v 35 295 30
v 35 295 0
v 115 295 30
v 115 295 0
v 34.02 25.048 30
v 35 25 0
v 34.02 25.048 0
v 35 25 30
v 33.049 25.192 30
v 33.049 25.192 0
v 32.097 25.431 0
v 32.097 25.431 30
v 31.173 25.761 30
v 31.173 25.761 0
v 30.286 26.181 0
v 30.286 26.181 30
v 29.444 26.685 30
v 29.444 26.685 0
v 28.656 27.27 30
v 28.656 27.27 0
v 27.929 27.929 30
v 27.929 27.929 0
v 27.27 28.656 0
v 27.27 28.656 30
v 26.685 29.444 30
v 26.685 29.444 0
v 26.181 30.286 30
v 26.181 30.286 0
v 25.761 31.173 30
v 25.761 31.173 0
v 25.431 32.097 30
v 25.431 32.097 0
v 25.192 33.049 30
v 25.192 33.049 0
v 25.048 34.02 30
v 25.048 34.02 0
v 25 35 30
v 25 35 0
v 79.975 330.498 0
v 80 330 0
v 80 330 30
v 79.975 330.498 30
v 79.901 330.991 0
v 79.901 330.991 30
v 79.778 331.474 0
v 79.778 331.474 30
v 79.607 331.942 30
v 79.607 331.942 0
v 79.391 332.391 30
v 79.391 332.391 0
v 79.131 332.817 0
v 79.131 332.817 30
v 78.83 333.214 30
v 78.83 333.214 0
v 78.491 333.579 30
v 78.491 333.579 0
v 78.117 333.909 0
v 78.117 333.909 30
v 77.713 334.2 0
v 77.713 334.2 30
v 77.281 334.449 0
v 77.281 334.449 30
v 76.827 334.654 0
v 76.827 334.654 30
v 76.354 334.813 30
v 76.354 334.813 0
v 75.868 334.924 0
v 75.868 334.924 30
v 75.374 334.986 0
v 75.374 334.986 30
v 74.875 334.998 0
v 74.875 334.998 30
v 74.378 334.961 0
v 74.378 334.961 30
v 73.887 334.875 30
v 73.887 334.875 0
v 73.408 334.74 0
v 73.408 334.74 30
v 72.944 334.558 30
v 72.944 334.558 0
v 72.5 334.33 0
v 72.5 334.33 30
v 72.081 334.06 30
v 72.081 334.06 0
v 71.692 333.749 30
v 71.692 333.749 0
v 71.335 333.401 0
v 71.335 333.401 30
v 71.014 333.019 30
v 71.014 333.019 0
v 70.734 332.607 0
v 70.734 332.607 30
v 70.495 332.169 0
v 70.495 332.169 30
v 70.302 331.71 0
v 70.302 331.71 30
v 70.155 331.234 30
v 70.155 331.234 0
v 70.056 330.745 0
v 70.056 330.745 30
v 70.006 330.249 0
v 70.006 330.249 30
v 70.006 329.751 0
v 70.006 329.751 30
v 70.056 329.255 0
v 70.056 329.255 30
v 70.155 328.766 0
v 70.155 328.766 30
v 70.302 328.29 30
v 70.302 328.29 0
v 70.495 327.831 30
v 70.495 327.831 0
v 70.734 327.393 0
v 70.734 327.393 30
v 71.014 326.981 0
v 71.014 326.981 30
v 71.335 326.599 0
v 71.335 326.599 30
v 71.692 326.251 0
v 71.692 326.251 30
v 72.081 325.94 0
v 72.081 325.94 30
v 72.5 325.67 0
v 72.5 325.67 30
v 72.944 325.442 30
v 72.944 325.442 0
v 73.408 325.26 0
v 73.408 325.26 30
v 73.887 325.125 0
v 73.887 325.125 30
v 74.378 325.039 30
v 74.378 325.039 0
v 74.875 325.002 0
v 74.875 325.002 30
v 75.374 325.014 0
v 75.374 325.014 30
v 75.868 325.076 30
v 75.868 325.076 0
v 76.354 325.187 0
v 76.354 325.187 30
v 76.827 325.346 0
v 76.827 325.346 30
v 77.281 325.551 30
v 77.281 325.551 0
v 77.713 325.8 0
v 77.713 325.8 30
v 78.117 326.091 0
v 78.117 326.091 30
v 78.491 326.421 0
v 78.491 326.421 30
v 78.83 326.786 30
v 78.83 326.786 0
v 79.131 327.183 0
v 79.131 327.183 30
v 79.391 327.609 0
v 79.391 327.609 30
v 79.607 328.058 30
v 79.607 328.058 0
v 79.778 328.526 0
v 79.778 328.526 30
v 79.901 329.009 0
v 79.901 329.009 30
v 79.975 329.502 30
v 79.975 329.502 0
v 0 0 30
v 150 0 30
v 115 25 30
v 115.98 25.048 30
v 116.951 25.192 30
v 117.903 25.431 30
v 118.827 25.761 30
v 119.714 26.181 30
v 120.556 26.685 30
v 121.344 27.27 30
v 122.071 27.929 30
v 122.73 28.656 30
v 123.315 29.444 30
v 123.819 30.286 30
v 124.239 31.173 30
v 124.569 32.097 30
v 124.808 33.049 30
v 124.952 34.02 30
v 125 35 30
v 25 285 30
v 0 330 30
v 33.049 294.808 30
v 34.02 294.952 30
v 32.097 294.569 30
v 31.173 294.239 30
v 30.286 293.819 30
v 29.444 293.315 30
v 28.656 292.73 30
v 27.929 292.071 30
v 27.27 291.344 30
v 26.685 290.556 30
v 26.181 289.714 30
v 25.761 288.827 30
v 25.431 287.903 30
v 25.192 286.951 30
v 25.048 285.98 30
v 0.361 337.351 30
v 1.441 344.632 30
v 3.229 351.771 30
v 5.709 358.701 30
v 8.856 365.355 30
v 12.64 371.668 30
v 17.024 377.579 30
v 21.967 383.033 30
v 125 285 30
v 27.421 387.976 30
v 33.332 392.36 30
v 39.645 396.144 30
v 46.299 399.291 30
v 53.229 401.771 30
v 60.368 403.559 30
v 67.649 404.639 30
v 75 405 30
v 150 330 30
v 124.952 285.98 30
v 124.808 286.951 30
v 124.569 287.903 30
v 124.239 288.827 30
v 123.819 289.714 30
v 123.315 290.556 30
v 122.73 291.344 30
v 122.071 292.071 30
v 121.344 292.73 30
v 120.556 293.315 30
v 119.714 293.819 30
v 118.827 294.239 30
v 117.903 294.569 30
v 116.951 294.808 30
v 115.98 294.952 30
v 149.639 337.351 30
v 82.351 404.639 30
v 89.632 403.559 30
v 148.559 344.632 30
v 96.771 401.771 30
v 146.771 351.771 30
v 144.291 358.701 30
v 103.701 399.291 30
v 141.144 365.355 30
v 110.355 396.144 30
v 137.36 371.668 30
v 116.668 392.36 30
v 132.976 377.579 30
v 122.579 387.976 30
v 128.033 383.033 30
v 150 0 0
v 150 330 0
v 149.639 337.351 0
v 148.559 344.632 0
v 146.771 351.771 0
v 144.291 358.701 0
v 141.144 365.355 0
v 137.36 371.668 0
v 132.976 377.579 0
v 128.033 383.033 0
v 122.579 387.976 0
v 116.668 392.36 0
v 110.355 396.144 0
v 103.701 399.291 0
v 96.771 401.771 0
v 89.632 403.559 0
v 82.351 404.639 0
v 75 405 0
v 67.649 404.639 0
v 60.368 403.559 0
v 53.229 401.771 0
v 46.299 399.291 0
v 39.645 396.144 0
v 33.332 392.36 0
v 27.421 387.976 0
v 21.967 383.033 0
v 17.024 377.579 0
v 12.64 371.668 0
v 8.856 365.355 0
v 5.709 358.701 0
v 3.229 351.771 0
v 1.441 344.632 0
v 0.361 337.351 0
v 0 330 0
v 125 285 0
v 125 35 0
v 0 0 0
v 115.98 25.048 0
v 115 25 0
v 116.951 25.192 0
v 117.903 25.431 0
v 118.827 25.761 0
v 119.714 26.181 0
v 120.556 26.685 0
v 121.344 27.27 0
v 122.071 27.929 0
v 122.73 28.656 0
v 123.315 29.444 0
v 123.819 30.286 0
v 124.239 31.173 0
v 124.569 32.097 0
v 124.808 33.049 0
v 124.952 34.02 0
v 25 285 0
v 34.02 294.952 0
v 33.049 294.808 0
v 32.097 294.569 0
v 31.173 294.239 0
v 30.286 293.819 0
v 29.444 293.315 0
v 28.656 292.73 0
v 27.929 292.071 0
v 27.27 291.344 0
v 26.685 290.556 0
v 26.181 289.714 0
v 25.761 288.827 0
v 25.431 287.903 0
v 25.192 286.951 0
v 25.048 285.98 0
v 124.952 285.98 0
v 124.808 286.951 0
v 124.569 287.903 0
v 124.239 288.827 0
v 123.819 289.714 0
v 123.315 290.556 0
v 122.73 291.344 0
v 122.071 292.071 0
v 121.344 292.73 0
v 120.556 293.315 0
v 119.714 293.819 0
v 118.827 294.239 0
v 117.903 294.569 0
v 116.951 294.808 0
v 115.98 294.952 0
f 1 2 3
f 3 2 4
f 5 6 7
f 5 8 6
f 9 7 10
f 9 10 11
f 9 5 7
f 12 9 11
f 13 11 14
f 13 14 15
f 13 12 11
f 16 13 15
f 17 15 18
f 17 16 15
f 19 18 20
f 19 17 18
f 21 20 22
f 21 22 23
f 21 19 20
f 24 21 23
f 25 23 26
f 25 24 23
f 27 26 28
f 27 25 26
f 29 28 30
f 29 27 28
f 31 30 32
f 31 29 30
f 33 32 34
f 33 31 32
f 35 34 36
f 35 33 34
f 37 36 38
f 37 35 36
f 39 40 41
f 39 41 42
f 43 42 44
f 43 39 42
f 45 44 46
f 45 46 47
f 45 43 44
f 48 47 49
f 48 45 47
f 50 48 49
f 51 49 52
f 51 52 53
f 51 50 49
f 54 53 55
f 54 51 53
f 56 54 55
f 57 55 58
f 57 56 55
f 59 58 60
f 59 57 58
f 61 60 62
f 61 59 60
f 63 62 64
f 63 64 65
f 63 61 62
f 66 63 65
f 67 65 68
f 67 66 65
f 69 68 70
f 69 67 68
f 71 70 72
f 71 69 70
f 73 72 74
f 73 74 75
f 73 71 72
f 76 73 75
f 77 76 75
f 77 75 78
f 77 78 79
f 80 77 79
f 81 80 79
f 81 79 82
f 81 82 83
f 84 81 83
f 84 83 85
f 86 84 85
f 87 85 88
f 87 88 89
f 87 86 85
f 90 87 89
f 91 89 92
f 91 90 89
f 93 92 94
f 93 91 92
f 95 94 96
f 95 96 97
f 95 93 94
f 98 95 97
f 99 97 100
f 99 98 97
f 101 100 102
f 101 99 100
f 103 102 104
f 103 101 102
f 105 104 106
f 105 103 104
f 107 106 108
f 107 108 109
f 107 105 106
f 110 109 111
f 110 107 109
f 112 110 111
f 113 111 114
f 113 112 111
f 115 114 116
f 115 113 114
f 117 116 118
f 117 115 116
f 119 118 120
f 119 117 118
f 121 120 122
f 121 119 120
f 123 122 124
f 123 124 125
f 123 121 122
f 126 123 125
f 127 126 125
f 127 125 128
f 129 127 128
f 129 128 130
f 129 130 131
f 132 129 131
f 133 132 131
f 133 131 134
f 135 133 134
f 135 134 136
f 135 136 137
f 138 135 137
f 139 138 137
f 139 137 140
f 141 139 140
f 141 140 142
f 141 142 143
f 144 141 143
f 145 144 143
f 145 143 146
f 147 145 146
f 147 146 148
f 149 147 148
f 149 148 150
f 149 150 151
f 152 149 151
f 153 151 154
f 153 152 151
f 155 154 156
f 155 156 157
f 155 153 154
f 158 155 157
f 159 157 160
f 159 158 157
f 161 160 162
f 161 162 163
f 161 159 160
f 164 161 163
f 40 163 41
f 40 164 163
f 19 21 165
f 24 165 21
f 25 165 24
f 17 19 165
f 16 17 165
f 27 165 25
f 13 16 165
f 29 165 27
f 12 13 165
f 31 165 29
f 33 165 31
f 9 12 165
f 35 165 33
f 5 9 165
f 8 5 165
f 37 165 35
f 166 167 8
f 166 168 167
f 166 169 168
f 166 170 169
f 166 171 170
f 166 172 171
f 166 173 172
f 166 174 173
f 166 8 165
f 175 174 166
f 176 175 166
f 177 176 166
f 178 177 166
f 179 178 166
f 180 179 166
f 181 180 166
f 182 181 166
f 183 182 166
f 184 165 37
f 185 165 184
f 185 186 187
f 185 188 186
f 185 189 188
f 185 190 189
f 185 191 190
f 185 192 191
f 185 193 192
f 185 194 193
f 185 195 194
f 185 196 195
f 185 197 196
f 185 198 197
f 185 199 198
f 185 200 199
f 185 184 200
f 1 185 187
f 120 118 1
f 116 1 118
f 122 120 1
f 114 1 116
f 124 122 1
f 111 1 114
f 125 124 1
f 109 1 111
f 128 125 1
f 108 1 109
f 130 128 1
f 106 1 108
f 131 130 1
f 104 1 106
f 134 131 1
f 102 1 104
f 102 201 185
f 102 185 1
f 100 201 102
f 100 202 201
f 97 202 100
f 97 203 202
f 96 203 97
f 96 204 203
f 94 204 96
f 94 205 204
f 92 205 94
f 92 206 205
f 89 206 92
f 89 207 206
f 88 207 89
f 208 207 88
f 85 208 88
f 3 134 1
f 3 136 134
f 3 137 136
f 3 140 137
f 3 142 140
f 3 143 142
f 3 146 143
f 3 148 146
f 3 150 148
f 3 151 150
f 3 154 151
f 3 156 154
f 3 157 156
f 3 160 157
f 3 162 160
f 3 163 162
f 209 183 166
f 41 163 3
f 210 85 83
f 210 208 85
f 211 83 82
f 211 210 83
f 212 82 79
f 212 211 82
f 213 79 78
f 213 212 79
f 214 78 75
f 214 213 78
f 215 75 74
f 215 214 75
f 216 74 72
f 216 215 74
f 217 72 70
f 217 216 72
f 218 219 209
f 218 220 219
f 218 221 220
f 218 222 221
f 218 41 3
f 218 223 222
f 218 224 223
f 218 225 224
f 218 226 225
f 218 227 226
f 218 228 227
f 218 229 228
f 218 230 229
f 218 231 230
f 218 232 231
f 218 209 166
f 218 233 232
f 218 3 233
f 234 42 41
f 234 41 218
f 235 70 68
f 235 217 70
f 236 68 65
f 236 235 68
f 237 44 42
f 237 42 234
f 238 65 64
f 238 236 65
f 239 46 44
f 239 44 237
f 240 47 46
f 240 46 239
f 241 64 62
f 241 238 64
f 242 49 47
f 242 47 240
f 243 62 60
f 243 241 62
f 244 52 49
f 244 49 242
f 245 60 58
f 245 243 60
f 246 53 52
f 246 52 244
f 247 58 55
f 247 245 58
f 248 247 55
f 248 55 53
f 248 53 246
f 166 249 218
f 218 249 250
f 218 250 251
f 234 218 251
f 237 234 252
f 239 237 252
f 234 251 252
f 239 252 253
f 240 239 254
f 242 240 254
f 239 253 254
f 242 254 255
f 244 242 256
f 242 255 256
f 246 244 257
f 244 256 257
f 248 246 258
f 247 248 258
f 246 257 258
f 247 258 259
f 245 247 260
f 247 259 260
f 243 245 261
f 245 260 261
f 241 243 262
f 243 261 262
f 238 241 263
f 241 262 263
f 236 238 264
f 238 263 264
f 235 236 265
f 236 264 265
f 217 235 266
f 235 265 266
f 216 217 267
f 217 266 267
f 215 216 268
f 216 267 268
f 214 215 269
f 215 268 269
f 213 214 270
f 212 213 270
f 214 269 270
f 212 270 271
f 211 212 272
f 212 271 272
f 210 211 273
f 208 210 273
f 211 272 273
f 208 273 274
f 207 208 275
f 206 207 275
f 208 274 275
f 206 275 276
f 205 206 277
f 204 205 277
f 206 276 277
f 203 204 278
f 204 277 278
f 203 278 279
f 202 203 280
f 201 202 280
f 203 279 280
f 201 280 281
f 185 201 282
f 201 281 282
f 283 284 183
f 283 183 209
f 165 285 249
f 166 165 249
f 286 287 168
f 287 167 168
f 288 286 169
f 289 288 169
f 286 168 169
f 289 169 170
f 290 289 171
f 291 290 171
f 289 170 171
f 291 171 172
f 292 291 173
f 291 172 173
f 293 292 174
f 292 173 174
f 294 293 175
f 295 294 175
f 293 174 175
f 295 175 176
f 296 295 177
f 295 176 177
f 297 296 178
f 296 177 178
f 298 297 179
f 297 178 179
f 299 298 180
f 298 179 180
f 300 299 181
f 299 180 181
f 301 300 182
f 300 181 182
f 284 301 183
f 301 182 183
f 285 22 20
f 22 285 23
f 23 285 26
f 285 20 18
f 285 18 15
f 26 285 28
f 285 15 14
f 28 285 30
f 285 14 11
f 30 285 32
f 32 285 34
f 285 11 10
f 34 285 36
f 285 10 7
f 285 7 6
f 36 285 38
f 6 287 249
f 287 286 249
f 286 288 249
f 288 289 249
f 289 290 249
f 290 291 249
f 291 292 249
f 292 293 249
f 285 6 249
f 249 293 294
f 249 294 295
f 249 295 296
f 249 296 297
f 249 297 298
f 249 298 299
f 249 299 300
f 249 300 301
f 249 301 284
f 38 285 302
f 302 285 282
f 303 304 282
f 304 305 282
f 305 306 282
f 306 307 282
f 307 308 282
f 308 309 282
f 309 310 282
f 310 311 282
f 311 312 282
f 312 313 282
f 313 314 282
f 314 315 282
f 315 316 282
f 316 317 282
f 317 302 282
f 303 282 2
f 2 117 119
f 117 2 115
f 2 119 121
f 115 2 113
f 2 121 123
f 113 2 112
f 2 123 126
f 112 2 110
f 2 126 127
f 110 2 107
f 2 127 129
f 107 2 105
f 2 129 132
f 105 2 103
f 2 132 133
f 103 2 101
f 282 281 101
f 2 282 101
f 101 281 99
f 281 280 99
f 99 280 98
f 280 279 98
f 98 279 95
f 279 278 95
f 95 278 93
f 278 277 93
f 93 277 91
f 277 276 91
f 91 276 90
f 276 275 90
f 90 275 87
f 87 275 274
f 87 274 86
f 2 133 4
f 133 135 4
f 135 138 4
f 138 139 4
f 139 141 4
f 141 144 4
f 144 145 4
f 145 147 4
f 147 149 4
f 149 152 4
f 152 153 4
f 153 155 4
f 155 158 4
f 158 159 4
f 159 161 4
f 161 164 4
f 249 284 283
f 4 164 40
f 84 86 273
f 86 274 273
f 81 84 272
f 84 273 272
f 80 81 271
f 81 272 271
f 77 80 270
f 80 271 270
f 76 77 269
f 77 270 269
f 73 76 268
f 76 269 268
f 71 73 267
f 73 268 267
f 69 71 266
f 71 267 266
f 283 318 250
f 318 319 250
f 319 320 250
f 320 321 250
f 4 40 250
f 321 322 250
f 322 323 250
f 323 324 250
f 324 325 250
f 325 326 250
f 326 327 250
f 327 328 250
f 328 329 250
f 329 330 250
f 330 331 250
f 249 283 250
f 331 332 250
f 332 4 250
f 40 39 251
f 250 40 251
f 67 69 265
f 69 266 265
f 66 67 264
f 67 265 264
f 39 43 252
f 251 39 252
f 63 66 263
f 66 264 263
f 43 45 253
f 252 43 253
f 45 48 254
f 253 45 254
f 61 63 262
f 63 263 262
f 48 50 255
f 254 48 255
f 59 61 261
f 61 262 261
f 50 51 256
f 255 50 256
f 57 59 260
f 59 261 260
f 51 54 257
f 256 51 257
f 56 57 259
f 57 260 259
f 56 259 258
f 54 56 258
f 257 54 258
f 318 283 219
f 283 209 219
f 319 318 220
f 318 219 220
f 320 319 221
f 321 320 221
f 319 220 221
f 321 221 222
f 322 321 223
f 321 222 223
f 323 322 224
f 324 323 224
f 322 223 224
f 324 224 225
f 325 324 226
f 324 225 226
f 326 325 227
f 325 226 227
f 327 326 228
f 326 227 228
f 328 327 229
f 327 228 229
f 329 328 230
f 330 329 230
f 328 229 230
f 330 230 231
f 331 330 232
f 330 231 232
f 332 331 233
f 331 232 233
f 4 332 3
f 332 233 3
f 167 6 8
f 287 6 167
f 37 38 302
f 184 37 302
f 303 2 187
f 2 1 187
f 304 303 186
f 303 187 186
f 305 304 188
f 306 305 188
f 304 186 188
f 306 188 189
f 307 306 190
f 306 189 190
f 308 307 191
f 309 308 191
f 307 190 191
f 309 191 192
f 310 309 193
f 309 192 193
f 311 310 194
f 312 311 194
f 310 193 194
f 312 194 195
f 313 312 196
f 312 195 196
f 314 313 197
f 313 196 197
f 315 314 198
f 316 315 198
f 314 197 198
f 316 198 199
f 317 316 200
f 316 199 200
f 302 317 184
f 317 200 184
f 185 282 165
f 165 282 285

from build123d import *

# Parameters (mm, degrees)
SKETCH1_R           = 5
SKETCH1_W           = 100
SKETCH1_H           = 270
BOSS_EXTRUDE1_DEPTH = 30
FILLET1_R           = 10


with BuildPart() as part:
    # Sketch1 → Boss-Extrude1 (new body)
    with BuildSketch(Plane.XY):
        with BuildLine():
            Line((0, 0), (150, 0))
            Line((150, 0), (150, 330))
            ThreePointArc((150, 330), (75, 405), (0, 330))
            Line((0, 330), (0, 0))
        make_face()
        with Locations((75, 330)):
            Circle(SKETCH1_R, mode=Mode.SUBTRACT)
        with Locations((75, 160)):
            Rectangle(SKETCH1_W, SKETCH1_H, mode=Mode.SUBTRACT)
    extrude(amount=BOSS_EXTRUDE1_DEPTH)

    # Fillet1
    fillet1_edges = [part.edges().sort_by_distance(p)[0] for p in [
        (125, 295, 15),
        (25, 295, 15),
        (25, 25, 15),
        (125, 25, 15),
    ]]
    fillet(fillet1_edges, radius=FILLET1_R)


solid = part.part
